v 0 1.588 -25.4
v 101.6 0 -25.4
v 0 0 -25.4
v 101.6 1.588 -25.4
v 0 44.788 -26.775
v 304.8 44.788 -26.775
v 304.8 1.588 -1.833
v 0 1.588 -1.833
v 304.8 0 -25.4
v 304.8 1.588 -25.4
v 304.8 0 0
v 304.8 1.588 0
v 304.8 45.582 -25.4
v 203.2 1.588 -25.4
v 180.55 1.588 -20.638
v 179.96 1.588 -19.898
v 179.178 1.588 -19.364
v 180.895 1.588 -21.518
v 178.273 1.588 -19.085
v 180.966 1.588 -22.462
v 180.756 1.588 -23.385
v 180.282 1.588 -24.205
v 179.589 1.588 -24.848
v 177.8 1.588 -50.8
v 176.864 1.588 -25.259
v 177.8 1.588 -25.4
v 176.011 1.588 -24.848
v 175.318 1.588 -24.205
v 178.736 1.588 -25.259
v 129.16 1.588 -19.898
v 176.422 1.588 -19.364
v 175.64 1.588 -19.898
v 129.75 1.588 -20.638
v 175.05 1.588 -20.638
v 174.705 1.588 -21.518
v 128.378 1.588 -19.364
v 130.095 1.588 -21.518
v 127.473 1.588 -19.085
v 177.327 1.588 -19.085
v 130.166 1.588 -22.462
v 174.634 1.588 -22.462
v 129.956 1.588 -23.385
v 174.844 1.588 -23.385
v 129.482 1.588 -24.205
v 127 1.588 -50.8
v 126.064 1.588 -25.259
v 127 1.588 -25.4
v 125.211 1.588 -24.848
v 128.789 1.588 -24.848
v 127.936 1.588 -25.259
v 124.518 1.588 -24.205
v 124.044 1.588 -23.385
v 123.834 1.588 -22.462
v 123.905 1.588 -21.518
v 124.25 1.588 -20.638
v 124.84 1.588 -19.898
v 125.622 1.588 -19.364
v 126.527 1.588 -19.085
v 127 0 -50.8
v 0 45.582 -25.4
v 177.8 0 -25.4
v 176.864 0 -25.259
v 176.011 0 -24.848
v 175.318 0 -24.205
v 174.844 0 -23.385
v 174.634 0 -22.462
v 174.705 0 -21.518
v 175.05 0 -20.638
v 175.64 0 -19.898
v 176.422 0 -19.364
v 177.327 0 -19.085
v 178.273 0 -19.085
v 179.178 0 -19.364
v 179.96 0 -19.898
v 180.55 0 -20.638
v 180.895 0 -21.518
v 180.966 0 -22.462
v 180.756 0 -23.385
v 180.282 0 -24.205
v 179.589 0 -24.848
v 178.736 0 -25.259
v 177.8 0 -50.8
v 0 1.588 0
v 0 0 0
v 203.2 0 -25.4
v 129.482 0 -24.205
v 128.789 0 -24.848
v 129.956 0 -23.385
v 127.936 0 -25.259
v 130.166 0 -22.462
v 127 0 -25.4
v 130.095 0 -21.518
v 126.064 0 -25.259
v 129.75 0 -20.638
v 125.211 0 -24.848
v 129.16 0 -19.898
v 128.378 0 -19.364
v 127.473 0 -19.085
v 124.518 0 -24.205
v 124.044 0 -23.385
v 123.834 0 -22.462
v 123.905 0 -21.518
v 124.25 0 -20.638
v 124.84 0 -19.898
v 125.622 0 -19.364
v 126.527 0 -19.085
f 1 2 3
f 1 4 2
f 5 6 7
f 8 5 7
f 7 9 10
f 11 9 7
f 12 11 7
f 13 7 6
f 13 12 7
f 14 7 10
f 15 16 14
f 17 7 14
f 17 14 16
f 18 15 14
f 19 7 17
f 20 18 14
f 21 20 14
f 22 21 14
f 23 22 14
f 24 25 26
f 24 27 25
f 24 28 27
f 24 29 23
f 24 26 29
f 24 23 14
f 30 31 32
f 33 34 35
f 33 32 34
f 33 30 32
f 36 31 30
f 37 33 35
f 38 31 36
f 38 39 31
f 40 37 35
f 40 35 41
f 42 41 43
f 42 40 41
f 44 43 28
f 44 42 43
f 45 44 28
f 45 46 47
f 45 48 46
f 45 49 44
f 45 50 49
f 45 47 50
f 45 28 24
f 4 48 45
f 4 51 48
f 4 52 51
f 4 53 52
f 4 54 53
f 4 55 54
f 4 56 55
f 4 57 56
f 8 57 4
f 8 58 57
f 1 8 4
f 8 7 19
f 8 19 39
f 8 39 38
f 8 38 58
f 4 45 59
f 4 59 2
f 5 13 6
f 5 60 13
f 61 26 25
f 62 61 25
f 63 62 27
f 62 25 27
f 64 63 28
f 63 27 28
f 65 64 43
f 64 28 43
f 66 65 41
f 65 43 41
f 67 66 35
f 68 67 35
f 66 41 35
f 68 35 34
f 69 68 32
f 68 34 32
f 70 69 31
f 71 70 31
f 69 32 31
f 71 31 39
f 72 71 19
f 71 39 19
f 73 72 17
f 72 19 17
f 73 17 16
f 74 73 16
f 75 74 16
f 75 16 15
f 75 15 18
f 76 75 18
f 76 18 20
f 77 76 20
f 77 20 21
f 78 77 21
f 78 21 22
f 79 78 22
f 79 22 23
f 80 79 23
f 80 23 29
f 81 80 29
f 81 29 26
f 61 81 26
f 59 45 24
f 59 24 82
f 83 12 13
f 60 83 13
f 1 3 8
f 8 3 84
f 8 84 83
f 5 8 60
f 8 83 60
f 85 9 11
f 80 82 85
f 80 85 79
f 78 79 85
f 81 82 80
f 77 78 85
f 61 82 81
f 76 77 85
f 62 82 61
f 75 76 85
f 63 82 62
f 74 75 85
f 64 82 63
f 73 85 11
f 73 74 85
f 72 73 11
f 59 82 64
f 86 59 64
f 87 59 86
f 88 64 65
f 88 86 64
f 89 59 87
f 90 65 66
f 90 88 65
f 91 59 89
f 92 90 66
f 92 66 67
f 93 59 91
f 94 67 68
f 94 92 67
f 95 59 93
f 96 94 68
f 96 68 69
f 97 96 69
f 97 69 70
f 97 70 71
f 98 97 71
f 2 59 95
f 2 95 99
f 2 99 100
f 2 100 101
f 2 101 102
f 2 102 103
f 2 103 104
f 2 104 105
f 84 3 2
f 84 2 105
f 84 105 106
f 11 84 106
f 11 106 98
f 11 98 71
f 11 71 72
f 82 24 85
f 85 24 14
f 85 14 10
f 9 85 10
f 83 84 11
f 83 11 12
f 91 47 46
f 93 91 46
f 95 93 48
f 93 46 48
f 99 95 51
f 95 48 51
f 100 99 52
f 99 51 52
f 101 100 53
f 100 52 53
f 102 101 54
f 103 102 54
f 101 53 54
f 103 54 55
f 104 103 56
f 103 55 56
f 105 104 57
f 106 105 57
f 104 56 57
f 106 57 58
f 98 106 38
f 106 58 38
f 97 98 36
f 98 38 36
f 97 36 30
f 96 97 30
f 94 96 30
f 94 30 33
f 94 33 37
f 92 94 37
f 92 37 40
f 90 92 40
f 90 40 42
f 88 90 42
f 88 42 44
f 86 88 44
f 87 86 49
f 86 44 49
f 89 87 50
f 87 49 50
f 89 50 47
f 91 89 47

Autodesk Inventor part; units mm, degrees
ref_plane "YZ Plane" through (0, 0, 0) normal (1, 0, 0) x (0, 1, 0)
ref_plane "XZ Plane" through (0, 0, 0) normal (0, 1, 0) x (-1, 0, 0)
ref_plane "XY Plane" through (0, 0, 0) normal (0, 0, 1) x (1, 0, 0)
sketch "Sketch1" plane through (0, 0, 0) normal (1, 0, 0) x (0, 1, 0)
  line L0 (0, 0) -> (1.5875, 0)
  line L1 (1.5875, 0) -> (1.5875, -50.8)
  line L2 (1.5875, -50.8) -> (0, -50.8)
  line L3 (0, -50.8) -> (0, 0)
  line L4 (1.5875, 0) -> (45.5816, -25.4)
  line L5 (45.5816, -25.4) -> (44.7878, -26.7748)
  line L6 (44.7878, -26.7748) -> (0.7938, -1.3748)
  line L7 (0.7938, -1.3748) -> (1.5875, 0)
  line L8 (1.5875, 0) -> (52.3875, 0) construction
  dimension "d0" = 1.5875
  dimension "d1" = 50.8
  dimension "d2" = 50.8
  dimension "d3" = 30
  dimension "d4" = 1.5875
extrude "Extrusion1" add sketch "Sketch1" along normal blind 304.8
sketch "Sketch2" plane through (0, 0, -50.8) normal (0, -1, 0) x (1, 0, 0)
  line L0 (0, 0) -> (304.8, 0) projected
  line L1 (304.8, 50.8) -> (304.8, 0) projected
  point P0 (177.8, 28.575)
  point P1 (127, 28.575)
  dimension "d7" = 28.575
  dimension "d8" = 28.575
  dimension "d9" = 127
  dimension "d10" = 177.8
hole "Hole1" at (177.8, 0, -22.225) at (127, 0, -22.225) direction (0, 1, 0) diameter 6.35 depth 6.35 tip angle 118
sketch "Sketch5" plane through (0, 1.5875, -1.8331) normal (0, 1, 0) x (1, 0, 0)
  line L0 (0, 48.9669) -> (304.8, 48.9669) projected
  line L1 (0, 48.9669) -> (101.6, 48.9669)
  line L2 (101.6, 48.9669) -> (101.6, 23.5669)
  line L3 (101.6, 23.5669) -> (0, 23.5669)
  line L4 (0, 23.5669) -> (0, 48.9669)
  line L5 (304.8, 48.9669) -> (203.2, 48.9669)
  line L6 (203.2, 48.9669) -> (203.2, 23.5669)
  line L7 (203.2, 23.5669) -> (304.8, 23.5669)
  line L8 (304.8, 23.5669) -> (304.8, 48.9669)
  line L9 (203.2, 48.9669) -> (177.8, 48.9669)
  line L10 (177.8, 48.9669) -> (203.2, 23.5669)
  line L11 (101.6, 48.9669) -> (127, 48.9669)
  line L12 (0, 48.9669) -> (304.8, 48.9669) projected
  line L13 (127, 48.9669) -> (101.6, 23.5669)
  point P0 (0, -1.8331)
  dimension "d28" = 101.6
  dimension "d29" = 25.4
  dimension "d30" = 101.6
  dimension "d31" = 25.4
  dimension "d32" = 25.4
  dimension "d33" = 25.4
extrude "Extrusion4" cut sketch "Sketch5" against normal blind 6.35
properties part number "stopper plate" material "Aluminum 6061"
